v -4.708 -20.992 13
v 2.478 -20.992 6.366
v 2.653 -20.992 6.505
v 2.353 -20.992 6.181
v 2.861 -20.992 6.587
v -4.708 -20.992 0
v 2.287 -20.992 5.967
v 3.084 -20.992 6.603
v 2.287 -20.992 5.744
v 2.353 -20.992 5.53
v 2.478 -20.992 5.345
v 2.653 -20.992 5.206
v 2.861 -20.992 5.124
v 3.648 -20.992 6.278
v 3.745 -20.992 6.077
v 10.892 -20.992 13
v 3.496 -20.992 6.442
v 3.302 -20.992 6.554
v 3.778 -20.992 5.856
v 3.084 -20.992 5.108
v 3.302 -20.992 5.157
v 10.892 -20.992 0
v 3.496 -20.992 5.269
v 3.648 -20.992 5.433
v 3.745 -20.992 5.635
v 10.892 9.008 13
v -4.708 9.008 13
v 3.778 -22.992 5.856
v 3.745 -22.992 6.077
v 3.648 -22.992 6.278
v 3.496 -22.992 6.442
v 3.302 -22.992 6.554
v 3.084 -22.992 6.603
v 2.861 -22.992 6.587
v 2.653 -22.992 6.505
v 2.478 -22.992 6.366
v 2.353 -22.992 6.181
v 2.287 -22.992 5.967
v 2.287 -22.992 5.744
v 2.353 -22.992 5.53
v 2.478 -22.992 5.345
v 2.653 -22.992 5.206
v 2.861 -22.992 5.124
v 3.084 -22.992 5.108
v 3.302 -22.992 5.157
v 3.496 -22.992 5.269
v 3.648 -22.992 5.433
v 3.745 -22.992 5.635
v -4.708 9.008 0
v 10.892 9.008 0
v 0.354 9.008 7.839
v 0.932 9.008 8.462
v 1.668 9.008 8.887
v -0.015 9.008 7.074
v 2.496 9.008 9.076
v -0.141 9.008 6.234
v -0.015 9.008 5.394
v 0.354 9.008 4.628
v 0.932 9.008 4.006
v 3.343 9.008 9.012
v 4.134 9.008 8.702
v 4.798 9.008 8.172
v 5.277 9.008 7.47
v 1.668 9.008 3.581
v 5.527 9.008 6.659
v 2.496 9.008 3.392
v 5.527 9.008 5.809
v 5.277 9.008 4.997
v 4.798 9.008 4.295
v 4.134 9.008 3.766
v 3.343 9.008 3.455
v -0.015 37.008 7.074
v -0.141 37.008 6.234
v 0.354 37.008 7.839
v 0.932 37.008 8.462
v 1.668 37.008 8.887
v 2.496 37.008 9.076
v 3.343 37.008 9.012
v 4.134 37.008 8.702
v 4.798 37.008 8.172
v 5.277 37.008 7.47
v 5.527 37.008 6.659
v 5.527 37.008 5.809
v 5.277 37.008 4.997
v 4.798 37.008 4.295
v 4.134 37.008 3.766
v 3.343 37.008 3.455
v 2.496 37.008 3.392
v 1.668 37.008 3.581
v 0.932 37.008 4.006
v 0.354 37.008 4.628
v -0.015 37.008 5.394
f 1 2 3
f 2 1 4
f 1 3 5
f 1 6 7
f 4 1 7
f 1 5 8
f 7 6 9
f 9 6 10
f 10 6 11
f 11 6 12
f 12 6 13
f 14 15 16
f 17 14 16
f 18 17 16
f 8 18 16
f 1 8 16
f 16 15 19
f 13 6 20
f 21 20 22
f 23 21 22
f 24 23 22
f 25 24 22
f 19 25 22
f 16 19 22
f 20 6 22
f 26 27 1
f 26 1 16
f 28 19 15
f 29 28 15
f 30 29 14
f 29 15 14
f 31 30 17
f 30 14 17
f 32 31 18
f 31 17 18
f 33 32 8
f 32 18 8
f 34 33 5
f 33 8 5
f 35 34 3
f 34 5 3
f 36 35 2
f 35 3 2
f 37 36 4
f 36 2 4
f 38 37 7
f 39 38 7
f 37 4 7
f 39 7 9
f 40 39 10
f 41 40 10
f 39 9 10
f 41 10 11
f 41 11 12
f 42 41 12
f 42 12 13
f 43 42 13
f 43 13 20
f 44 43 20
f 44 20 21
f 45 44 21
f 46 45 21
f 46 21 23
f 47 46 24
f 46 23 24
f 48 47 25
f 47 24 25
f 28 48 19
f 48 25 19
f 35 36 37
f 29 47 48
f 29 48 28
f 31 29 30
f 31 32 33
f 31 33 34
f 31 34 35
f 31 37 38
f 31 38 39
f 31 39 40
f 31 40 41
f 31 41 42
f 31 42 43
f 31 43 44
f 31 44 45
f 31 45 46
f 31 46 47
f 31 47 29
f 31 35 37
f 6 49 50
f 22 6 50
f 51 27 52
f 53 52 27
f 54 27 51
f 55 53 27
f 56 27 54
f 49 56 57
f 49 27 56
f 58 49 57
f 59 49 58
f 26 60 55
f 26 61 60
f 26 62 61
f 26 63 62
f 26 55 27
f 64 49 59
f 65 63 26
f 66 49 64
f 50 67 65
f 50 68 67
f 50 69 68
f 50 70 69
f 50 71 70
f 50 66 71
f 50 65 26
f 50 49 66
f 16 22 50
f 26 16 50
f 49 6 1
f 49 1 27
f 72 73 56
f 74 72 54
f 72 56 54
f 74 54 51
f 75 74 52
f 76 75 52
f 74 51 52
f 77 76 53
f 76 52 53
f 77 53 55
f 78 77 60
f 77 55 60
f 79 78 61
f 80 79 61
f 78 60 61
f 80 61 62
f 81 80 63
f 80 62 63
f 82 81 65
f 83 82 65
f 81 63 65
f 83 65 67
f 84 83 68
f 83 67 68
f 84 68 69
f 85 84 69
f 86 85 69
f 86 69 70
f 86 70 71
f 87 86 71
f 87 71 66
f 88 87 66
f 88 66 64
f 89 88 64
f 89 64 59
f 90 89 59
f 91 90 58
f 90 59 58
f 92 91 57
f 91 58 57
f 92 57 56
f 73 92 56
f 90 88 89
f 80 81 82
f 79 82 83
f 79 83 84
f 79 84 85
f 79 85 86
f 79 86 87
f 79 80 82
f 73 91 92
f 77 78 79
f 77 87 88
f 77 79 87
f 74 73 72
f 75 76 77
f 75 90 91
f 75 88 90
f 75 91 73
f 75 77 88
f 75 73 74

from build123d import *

# Parameters (mm, degrees)
SKETCH_W     = 15.6
SKETCH_H     = 30
PAD_DEPTH    = 13
SKETCH001_R  = 2.85
PAD001_DEPTH = 28
SKETCH002_R  = 0.75
PAD002_DEPTH = 2


with BuildPart() as part:
    # Sketch → Pad (new body)
    with BuildSketch(Plane.XY):
        with Locations((3.092153, -5.992056)):
            Rectangle(SKETCH_W, SKETCH_H)
    extrude(amount=PAD_DEPTH)

    # Sketch001 (on Face4 of Pad) → Pad001 (join)
    with BuildSketch(Plane(origin=(0, 9.007944, 0), x_dir=(-1, 0, 0), z_dir=(0, 1, 0))):
        with Locations((-2.708779, 6.233849)):
            Circle(SKETCH001_R)
    extrude(amount=PAD001_DEPTH)

    # Sketch002 (on Face3 of Pad001) → Pad002 (join)
    with BuildSketch(Plane.XZ.offset(20.992056)):
        with Locations((3.028248, 5.855581)):
            Circle(SKETCH002_R)
    extrude(amount=PAD002_DEPTH)


solid = part.part
